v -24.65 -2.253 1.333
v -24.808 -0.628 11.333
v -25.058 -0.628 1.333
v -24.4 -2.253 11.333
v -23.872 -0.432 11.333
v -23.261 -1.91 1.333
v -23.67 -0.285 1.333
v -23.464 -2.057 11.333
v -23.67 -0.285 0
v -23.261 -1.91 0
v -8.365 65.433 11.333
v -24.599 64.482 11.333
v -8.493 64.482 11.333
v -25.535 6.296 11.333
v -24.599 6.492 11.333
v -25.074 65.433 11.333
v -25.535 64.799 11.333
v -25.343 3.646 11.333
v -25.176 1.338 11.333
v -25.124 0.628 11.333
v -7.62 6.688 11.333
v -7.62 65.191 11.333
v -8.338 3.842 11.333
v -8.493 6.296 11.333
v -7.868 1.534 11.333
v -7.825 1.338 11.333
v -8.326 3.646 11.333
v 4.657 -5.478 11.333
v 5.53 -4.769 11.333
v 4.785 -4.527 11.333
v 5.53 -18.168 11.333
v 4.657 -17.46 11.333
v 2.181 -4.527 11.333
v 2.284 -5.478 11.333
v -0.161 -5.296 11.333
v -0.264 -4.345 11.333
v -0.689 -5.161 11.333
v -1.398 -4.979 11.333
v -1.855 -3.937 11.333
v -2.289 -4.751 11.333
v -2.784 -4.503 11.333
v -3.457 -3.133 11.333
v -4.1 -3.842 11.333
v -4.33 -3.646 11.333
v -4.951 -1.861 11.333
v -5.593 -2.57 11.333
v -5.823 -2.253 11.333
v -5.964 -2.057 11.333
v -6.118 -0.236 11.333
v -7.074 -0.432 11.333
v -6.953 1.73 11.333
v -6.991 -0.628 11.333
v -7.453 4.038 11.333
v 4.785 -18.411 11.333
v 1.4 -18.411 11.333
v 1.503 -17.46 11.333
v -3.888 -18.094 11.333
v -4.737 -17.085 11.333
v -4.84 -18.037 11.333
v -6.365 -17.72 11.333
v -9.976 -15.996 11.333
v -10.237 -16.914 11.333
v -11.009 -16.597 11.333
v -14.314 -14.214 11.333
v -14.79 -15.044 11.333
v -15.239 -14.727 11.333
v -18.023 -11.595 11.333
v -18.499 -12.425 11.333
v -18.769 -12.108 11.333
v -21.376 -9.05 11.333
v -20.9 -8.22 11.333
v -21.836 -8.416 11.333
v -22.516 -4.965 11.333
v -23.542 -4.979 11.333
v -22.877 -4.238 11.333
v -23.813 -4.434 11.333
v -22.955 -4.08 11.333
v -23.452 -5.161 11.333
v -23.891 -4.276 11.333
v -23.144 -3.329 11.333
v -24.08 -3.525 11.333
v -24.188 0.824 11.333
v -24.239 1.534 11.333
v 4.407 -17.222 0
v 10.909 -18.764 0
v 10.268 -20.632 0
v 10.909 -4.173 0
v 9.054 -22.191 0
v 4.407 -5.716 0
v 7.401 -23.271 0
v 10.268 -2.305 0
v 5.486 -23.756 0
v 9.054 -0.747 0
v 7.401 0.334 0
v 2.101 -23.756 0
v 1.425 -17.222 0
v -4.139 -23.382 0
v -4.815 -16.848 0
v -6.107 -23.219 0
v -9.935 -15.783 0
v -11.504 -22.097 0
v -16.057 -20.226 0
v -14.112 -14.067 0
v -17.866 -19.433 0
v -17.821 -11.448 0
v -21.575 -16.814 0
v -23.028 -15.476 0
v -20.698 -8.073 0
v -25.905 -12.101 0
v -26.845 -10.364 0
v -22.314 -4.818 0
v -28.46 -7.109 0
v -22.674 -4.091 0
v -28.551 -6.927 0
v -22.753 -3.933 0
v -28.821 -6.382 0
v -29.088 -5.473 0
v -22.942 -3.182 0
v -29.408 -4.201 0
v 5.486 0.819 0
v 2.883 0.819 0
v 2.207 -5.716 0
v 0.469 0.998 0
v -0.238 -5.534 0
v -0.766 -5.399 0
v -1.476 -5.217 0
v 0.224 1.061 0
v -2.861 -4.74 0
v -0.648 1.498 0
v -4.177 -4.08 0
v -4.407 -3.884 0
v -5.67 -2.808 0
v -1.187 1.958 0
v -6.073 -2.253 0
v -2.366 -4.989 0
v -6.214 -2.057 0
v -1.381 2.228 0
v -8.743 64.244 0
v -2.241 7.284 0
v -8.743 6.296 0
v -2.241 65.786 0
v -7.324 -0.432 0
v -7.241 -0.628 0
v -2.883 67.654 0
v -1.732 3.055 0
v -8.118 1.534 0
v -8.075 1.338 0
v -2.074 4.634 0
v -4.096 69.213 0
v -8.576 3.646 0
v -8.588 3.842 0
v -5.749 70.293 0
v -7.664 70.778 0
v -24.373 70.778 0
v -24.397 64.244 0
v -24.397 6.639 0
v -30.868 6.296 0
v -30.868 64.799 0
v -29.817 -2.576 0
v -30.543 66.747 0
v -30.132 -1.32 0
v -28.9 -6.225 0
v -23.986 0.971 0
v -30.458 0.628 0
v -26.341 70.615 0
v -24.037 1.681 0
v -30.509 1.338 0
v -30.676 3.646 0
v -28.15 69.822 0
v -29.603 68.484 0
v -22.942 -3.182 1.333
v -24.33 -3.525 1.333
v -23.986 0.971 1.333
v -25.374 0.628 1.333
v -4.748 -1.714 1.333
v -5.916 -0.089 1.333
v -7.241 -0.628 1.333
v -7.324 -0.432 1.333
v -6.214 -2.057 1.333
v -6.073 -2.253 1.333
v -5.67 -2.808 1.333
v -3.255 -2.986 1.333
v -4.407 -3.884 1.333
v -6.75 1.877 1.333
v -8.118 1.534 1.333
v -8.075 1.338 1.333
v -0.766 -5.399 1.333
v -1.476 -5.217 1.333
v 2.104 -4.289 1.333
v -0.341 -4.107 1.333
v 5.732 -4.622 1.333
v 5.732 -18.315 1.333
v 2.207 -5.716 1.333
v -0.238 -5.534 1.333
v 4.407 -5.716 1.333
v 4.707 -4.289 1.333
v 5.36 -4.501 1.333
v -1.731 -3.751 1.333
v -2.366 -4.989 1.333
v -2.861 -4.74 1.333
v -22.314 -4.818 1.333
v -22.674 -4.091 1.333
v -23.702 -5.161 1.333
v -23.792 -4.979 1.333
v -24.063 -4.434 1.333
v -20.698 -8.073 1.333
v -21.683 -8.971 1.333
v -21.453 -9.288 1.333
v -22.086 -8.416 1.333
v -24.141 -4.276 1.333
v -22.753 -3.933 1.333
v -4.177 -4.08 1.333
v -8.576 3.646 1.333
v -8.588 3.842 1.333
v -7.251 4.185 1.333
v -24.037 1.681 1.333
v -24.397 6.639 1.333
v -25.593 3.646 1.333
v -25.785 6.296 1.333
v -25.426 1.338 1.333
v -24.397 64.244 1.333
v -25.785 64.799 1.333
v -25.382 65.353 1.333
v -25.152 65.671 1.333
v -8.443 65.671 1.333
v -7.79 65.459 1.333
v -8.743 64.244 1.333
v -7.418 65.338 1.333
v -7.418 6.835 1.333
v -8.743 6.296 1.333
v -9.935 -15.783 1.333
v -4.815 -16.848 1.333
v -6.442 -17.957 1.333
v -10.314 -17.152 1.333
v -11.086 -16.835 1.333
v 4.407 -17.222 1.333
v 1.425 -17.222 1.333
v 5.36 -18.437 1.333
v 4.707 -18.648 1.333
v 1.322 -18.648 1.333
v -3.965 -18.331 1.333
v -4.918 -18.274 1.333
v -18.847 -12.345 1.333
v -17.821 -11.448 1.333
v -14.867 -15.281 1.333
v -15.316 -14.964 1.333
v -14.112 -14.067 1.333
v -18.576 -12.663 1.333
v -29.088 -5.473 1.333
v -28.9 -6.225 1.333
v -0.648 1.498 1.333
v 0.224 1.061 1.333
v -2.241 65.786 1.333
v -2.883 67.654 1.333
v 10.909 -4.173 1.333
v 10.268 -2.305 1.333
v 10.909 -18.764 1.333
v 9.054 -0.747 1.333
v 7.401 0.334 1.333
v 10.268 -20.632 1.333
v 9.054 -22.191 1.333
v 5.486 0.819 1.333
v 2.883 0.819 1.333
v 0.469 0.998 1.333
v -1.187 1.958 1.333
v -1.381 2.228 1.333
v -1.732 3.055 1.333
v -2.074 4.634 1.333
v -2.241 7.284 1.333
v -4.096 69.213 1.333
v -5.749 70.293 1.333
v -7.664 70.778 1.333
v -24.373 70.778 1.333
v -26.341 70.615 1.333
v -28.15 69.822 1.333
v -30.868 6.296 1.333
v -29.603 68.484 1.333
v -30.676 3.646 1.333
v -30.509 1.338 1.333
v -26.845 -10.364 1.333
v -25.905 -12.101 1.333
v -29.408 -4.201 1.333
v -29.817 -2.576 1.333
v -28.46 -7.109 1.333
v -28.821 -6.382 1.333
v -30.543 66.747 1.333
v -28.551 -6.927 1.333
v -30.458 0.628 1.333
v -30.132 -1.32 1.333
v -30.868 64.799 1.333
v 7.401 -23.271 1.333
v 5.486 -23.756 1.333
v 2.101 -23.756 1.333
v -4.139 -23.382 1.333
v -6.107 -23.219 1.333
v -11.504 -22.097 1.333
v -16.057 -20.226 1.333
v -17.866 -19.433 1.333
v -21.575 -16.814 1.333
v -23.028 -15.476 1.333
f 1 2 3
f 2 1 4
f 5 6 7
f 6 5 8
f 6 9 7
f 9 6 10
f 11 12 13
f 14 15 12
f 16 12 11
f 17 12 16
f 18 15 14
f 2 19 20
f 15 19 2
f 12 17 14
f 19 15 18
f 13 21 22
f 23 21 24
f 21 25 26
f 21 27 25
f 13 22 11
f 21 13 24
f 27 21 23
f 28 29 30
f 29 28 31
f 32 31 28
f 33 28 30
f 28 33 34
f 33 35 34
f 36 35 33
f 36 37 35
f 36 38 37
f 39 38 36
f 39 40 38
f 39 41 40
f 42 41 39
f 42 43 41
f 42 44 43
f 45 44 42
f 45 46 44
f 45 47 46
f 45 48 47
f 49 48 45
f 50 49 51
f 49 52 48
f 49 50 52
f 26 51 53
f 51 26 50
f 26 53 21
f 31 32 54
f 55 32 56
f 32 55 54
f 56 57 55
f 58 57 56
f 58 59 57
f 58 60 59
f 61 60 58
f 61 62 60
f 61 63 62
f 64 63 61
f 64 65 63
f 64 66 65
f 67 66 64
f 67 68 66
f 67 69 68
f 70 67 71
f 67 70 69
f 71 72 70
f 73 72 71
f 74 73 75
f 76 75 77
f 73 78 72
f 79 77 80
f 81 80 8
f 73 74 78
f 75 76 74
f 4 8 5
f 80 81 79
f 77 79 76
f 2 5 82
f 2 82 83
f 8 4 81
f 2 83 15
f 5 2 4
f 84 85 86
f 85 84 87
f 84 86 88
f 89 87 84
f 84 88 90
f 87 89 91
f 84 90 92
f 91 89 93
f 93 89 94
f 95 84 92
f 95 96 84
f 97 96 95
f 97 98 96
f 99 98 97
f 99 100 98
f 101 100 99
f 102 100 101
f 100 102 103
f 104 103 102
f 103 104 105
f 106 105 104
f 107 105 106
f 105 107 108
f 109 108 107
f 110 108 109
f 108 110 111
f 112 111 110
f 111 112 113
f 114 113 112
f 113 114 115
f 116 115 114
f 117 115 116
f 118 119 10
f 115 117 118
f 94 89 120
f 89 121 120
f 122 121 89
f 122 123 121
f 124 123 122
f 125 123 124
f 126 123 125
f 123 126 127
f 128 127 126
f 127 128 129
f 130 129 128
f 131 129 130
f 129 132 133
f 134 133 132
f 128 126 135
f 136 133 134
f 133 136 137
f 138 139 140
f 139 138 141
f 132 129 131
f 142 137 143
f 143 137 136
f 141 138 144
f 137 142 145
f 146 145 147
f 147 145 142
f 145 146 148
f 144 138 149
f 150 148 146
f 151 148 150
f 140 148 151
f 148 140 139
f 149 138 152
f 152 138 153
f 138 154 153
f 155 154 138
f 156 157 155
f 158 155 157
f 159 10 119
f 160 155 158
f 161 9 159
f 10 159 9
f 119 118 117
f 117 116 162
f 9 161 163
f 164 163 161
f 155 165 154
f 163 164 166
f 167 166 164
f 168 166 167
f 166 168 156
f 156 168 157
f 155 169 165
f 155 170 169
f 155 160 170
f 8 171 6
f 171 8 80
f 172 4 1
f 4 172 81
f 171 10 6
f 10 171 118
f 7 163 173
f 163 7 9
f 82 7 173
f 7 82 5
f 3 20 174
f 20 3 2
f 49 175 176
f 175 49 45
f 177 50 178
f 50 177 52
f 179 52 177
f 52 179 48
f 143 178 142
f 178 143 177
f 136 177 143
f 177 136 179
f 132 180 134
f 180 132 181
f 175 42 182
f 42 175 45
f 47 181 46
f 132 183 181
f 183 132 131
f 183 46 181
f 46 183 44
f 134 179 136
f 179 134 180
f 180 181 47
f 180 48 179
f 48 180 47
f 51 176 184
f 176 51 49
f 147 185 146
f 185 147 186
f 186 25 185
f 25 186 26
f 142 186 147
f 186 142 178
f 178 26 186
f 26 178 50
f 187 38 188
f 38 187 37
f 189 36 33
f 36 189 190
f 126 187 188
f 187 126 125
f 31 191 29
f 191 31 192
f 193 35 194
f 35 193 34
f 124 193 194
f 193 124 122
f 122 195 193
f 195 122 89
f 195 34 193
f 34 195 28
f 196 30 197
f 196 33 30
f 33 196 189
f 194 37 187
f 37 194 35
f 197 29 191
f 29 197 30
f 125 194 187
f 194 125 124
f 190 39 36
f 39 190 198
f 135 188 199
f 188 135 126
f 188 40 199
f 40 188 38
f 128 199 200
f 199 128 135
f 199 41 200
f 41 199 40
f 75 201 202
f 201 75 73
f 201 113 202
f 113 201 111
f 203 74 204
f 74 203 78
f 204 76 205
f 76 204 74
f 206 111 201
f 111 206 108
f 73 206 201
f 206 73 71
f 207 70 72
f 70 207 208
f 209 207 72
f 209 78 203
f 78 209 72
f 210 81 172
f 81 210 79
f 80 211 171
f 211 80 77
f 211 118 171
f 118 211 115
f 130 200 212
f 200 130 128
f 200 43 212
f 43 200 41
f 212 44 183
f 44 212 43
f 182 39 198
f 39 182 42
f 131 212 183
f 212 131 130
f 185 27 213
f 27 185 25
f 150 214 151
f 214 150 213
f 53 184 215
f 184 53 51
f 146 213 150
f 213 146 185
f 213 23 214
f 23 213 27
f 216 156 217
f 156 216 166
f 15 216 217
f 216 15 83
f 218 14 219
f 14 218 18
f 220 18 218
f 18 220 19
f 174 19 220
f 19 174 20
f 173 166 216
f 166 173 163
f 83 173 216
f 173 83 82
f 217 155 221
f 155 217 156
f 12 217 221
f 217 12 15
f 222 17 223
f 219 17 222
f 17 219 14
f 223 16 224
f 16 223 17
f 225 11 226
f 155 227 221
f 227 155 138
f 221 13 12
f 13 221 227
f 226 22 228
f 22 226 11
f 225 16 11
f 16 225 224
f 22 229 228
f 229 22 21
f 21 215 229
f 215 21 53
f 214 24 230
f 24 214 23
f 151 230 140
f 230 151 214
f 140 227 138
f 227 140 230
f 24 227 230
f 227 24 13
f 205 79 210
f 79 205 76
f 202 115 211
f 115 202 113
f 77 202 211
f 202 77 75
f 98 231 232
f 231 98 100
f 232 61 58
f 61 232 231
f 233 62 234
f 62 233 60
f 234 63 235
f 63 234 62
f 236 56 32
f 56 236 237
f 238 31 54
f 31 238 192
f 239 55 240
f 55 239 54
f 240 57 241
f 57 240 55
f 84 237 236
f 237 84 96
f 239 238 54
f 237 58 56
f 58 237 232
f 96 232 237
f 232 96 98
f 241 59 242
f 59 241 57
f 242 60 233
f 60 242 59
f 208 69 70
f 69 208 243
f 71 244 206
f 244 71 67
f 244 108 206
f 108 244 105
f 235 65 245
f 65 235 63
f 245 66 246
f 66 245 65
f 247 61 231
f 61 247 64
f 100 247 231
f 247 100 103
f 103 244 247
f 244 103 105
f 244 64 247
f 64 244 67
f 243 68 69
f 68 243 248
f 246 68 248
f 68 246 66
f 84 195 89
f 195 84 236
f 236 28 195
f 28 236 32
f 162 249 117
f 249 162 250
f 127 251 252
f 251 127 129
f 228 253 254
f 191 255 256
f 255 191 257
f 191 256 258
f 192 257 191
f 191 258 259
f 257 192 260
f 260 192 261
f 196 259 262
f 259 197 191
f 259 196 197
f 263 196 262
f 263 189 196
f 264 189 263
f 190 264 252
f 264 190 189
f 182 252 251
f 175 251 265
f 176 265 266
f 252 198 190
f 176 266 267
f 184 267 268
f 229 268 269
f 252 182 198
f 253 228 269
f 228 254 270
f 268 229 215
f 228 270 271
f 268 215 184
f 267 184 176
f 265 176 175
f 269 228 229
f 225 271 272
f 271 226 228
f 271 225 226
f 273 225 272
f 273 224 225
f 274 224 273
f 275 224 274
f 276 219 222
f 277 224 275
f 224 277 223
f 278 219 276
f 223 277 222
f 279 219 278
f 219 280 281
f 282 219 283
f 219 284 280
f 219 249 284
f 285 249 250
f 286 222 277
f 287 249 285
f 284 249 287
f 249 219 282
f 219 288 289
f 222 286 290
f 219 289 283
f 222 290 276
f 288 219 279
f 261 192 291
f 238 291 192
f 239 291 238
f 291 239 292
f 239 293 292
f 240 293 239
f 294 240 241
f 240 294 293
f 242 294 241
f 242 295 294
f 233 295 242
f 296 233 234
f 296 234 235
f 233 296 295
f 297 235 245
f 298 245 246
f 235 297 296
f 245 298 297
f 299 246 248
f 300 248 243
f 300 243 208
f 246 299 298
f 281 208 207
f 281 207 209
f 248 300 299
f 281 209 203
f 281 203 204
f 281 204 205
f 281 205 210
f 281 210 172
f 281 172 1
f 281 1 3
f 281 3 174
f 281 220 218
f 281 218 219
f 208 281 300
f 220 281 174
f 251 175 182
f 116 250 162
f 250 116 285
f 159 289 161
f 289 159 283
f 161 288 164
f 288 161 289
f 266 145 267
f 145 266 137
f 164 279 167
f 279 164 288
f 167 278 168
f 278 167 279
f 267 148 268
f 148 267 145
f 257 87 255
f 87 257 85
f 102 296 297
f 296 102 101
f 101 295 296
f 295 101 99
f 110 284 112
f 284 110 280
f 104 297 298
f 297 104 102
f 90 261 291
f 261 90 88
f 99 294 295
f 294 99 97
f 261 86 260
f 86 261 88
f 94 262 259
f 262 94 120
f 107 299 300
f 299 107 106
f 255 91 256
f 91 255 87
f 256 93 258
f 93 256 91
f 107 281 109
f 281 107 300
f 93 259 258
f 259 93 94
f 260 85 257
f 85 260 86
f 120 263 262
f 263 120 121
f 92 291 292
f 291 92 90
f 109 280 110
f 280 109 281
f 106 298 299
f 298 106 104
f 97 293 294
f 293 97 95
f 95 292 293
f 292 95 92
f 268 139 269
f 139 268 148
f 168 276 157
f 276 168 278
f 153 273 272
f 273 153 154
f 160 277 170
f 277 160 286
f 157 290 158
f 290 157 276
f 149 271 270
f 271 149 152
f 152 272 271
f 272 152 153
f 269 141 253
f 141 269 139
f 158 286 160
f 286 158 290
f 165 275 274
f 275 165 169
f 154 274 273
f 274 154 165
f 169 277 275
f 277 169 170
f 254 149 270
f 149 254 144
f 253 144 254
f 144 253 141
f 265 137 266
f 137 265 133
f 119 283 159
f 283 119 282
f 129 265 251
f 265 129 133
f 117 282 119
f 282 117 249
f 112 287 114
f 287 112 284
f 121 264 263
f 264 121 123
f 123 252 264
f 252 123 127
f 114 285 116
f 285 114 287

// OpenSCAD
/**
 * Original script from http://www.thingiverse.com/thing:28882
 */

// Text for the cutter.
cutter_text = "J";

// Height of the cutter in mm.
cutter_size = 64;

// Font to use for the cutter, in the style "<Font Name>:style=<Font Style>". See http://en.wikibooks.org/wiki/OpenSCAD_User_Manual/Text#Using_fonts
cutter_font = "Arial Black:style=Bold";

// Thickness of the cutter in mm.
cutter_thickness = 1.75;

// Height of the flange in mm.
flange_height = 2;

// Height of the cutter in mm, in addition to the flange height.
cutter_height = 10;

// Width of the flange in mm.
flange_width = 6;

cutterMinimum = 1;

mirror([1, 0, 0]) {
    minkowski() {
            outline();
            cylinder(r1 = cutter_thickness / 3, r2 = cutterMinimum / 3, h = cutter_height);
    };
    
    flange();
};

module flange() {
	difference() {
		minkowski() {
			baseShape(h=flange_height / 3);
			cylinder(r = flange_width, h = flange_height / 3);
		};

		translate([0, 0, -0.01]) baseShape(h=flange_height * 1.1);
	};
}

module outline() {
	difference() {
		minkowski() {
			baseShape(h=flange_height / 3);
			cylinder(r = cutterMinimum / 3, h=flange_height / 3);
		}

		translate([0, 0, -0.01]) baseShape(h=flange_height * 1.1);
	};
};

module baseShape(h) {
	linear_extrude(height=h) text(text=cutter_text, size=cutter_size, font=cutter_font);
}
